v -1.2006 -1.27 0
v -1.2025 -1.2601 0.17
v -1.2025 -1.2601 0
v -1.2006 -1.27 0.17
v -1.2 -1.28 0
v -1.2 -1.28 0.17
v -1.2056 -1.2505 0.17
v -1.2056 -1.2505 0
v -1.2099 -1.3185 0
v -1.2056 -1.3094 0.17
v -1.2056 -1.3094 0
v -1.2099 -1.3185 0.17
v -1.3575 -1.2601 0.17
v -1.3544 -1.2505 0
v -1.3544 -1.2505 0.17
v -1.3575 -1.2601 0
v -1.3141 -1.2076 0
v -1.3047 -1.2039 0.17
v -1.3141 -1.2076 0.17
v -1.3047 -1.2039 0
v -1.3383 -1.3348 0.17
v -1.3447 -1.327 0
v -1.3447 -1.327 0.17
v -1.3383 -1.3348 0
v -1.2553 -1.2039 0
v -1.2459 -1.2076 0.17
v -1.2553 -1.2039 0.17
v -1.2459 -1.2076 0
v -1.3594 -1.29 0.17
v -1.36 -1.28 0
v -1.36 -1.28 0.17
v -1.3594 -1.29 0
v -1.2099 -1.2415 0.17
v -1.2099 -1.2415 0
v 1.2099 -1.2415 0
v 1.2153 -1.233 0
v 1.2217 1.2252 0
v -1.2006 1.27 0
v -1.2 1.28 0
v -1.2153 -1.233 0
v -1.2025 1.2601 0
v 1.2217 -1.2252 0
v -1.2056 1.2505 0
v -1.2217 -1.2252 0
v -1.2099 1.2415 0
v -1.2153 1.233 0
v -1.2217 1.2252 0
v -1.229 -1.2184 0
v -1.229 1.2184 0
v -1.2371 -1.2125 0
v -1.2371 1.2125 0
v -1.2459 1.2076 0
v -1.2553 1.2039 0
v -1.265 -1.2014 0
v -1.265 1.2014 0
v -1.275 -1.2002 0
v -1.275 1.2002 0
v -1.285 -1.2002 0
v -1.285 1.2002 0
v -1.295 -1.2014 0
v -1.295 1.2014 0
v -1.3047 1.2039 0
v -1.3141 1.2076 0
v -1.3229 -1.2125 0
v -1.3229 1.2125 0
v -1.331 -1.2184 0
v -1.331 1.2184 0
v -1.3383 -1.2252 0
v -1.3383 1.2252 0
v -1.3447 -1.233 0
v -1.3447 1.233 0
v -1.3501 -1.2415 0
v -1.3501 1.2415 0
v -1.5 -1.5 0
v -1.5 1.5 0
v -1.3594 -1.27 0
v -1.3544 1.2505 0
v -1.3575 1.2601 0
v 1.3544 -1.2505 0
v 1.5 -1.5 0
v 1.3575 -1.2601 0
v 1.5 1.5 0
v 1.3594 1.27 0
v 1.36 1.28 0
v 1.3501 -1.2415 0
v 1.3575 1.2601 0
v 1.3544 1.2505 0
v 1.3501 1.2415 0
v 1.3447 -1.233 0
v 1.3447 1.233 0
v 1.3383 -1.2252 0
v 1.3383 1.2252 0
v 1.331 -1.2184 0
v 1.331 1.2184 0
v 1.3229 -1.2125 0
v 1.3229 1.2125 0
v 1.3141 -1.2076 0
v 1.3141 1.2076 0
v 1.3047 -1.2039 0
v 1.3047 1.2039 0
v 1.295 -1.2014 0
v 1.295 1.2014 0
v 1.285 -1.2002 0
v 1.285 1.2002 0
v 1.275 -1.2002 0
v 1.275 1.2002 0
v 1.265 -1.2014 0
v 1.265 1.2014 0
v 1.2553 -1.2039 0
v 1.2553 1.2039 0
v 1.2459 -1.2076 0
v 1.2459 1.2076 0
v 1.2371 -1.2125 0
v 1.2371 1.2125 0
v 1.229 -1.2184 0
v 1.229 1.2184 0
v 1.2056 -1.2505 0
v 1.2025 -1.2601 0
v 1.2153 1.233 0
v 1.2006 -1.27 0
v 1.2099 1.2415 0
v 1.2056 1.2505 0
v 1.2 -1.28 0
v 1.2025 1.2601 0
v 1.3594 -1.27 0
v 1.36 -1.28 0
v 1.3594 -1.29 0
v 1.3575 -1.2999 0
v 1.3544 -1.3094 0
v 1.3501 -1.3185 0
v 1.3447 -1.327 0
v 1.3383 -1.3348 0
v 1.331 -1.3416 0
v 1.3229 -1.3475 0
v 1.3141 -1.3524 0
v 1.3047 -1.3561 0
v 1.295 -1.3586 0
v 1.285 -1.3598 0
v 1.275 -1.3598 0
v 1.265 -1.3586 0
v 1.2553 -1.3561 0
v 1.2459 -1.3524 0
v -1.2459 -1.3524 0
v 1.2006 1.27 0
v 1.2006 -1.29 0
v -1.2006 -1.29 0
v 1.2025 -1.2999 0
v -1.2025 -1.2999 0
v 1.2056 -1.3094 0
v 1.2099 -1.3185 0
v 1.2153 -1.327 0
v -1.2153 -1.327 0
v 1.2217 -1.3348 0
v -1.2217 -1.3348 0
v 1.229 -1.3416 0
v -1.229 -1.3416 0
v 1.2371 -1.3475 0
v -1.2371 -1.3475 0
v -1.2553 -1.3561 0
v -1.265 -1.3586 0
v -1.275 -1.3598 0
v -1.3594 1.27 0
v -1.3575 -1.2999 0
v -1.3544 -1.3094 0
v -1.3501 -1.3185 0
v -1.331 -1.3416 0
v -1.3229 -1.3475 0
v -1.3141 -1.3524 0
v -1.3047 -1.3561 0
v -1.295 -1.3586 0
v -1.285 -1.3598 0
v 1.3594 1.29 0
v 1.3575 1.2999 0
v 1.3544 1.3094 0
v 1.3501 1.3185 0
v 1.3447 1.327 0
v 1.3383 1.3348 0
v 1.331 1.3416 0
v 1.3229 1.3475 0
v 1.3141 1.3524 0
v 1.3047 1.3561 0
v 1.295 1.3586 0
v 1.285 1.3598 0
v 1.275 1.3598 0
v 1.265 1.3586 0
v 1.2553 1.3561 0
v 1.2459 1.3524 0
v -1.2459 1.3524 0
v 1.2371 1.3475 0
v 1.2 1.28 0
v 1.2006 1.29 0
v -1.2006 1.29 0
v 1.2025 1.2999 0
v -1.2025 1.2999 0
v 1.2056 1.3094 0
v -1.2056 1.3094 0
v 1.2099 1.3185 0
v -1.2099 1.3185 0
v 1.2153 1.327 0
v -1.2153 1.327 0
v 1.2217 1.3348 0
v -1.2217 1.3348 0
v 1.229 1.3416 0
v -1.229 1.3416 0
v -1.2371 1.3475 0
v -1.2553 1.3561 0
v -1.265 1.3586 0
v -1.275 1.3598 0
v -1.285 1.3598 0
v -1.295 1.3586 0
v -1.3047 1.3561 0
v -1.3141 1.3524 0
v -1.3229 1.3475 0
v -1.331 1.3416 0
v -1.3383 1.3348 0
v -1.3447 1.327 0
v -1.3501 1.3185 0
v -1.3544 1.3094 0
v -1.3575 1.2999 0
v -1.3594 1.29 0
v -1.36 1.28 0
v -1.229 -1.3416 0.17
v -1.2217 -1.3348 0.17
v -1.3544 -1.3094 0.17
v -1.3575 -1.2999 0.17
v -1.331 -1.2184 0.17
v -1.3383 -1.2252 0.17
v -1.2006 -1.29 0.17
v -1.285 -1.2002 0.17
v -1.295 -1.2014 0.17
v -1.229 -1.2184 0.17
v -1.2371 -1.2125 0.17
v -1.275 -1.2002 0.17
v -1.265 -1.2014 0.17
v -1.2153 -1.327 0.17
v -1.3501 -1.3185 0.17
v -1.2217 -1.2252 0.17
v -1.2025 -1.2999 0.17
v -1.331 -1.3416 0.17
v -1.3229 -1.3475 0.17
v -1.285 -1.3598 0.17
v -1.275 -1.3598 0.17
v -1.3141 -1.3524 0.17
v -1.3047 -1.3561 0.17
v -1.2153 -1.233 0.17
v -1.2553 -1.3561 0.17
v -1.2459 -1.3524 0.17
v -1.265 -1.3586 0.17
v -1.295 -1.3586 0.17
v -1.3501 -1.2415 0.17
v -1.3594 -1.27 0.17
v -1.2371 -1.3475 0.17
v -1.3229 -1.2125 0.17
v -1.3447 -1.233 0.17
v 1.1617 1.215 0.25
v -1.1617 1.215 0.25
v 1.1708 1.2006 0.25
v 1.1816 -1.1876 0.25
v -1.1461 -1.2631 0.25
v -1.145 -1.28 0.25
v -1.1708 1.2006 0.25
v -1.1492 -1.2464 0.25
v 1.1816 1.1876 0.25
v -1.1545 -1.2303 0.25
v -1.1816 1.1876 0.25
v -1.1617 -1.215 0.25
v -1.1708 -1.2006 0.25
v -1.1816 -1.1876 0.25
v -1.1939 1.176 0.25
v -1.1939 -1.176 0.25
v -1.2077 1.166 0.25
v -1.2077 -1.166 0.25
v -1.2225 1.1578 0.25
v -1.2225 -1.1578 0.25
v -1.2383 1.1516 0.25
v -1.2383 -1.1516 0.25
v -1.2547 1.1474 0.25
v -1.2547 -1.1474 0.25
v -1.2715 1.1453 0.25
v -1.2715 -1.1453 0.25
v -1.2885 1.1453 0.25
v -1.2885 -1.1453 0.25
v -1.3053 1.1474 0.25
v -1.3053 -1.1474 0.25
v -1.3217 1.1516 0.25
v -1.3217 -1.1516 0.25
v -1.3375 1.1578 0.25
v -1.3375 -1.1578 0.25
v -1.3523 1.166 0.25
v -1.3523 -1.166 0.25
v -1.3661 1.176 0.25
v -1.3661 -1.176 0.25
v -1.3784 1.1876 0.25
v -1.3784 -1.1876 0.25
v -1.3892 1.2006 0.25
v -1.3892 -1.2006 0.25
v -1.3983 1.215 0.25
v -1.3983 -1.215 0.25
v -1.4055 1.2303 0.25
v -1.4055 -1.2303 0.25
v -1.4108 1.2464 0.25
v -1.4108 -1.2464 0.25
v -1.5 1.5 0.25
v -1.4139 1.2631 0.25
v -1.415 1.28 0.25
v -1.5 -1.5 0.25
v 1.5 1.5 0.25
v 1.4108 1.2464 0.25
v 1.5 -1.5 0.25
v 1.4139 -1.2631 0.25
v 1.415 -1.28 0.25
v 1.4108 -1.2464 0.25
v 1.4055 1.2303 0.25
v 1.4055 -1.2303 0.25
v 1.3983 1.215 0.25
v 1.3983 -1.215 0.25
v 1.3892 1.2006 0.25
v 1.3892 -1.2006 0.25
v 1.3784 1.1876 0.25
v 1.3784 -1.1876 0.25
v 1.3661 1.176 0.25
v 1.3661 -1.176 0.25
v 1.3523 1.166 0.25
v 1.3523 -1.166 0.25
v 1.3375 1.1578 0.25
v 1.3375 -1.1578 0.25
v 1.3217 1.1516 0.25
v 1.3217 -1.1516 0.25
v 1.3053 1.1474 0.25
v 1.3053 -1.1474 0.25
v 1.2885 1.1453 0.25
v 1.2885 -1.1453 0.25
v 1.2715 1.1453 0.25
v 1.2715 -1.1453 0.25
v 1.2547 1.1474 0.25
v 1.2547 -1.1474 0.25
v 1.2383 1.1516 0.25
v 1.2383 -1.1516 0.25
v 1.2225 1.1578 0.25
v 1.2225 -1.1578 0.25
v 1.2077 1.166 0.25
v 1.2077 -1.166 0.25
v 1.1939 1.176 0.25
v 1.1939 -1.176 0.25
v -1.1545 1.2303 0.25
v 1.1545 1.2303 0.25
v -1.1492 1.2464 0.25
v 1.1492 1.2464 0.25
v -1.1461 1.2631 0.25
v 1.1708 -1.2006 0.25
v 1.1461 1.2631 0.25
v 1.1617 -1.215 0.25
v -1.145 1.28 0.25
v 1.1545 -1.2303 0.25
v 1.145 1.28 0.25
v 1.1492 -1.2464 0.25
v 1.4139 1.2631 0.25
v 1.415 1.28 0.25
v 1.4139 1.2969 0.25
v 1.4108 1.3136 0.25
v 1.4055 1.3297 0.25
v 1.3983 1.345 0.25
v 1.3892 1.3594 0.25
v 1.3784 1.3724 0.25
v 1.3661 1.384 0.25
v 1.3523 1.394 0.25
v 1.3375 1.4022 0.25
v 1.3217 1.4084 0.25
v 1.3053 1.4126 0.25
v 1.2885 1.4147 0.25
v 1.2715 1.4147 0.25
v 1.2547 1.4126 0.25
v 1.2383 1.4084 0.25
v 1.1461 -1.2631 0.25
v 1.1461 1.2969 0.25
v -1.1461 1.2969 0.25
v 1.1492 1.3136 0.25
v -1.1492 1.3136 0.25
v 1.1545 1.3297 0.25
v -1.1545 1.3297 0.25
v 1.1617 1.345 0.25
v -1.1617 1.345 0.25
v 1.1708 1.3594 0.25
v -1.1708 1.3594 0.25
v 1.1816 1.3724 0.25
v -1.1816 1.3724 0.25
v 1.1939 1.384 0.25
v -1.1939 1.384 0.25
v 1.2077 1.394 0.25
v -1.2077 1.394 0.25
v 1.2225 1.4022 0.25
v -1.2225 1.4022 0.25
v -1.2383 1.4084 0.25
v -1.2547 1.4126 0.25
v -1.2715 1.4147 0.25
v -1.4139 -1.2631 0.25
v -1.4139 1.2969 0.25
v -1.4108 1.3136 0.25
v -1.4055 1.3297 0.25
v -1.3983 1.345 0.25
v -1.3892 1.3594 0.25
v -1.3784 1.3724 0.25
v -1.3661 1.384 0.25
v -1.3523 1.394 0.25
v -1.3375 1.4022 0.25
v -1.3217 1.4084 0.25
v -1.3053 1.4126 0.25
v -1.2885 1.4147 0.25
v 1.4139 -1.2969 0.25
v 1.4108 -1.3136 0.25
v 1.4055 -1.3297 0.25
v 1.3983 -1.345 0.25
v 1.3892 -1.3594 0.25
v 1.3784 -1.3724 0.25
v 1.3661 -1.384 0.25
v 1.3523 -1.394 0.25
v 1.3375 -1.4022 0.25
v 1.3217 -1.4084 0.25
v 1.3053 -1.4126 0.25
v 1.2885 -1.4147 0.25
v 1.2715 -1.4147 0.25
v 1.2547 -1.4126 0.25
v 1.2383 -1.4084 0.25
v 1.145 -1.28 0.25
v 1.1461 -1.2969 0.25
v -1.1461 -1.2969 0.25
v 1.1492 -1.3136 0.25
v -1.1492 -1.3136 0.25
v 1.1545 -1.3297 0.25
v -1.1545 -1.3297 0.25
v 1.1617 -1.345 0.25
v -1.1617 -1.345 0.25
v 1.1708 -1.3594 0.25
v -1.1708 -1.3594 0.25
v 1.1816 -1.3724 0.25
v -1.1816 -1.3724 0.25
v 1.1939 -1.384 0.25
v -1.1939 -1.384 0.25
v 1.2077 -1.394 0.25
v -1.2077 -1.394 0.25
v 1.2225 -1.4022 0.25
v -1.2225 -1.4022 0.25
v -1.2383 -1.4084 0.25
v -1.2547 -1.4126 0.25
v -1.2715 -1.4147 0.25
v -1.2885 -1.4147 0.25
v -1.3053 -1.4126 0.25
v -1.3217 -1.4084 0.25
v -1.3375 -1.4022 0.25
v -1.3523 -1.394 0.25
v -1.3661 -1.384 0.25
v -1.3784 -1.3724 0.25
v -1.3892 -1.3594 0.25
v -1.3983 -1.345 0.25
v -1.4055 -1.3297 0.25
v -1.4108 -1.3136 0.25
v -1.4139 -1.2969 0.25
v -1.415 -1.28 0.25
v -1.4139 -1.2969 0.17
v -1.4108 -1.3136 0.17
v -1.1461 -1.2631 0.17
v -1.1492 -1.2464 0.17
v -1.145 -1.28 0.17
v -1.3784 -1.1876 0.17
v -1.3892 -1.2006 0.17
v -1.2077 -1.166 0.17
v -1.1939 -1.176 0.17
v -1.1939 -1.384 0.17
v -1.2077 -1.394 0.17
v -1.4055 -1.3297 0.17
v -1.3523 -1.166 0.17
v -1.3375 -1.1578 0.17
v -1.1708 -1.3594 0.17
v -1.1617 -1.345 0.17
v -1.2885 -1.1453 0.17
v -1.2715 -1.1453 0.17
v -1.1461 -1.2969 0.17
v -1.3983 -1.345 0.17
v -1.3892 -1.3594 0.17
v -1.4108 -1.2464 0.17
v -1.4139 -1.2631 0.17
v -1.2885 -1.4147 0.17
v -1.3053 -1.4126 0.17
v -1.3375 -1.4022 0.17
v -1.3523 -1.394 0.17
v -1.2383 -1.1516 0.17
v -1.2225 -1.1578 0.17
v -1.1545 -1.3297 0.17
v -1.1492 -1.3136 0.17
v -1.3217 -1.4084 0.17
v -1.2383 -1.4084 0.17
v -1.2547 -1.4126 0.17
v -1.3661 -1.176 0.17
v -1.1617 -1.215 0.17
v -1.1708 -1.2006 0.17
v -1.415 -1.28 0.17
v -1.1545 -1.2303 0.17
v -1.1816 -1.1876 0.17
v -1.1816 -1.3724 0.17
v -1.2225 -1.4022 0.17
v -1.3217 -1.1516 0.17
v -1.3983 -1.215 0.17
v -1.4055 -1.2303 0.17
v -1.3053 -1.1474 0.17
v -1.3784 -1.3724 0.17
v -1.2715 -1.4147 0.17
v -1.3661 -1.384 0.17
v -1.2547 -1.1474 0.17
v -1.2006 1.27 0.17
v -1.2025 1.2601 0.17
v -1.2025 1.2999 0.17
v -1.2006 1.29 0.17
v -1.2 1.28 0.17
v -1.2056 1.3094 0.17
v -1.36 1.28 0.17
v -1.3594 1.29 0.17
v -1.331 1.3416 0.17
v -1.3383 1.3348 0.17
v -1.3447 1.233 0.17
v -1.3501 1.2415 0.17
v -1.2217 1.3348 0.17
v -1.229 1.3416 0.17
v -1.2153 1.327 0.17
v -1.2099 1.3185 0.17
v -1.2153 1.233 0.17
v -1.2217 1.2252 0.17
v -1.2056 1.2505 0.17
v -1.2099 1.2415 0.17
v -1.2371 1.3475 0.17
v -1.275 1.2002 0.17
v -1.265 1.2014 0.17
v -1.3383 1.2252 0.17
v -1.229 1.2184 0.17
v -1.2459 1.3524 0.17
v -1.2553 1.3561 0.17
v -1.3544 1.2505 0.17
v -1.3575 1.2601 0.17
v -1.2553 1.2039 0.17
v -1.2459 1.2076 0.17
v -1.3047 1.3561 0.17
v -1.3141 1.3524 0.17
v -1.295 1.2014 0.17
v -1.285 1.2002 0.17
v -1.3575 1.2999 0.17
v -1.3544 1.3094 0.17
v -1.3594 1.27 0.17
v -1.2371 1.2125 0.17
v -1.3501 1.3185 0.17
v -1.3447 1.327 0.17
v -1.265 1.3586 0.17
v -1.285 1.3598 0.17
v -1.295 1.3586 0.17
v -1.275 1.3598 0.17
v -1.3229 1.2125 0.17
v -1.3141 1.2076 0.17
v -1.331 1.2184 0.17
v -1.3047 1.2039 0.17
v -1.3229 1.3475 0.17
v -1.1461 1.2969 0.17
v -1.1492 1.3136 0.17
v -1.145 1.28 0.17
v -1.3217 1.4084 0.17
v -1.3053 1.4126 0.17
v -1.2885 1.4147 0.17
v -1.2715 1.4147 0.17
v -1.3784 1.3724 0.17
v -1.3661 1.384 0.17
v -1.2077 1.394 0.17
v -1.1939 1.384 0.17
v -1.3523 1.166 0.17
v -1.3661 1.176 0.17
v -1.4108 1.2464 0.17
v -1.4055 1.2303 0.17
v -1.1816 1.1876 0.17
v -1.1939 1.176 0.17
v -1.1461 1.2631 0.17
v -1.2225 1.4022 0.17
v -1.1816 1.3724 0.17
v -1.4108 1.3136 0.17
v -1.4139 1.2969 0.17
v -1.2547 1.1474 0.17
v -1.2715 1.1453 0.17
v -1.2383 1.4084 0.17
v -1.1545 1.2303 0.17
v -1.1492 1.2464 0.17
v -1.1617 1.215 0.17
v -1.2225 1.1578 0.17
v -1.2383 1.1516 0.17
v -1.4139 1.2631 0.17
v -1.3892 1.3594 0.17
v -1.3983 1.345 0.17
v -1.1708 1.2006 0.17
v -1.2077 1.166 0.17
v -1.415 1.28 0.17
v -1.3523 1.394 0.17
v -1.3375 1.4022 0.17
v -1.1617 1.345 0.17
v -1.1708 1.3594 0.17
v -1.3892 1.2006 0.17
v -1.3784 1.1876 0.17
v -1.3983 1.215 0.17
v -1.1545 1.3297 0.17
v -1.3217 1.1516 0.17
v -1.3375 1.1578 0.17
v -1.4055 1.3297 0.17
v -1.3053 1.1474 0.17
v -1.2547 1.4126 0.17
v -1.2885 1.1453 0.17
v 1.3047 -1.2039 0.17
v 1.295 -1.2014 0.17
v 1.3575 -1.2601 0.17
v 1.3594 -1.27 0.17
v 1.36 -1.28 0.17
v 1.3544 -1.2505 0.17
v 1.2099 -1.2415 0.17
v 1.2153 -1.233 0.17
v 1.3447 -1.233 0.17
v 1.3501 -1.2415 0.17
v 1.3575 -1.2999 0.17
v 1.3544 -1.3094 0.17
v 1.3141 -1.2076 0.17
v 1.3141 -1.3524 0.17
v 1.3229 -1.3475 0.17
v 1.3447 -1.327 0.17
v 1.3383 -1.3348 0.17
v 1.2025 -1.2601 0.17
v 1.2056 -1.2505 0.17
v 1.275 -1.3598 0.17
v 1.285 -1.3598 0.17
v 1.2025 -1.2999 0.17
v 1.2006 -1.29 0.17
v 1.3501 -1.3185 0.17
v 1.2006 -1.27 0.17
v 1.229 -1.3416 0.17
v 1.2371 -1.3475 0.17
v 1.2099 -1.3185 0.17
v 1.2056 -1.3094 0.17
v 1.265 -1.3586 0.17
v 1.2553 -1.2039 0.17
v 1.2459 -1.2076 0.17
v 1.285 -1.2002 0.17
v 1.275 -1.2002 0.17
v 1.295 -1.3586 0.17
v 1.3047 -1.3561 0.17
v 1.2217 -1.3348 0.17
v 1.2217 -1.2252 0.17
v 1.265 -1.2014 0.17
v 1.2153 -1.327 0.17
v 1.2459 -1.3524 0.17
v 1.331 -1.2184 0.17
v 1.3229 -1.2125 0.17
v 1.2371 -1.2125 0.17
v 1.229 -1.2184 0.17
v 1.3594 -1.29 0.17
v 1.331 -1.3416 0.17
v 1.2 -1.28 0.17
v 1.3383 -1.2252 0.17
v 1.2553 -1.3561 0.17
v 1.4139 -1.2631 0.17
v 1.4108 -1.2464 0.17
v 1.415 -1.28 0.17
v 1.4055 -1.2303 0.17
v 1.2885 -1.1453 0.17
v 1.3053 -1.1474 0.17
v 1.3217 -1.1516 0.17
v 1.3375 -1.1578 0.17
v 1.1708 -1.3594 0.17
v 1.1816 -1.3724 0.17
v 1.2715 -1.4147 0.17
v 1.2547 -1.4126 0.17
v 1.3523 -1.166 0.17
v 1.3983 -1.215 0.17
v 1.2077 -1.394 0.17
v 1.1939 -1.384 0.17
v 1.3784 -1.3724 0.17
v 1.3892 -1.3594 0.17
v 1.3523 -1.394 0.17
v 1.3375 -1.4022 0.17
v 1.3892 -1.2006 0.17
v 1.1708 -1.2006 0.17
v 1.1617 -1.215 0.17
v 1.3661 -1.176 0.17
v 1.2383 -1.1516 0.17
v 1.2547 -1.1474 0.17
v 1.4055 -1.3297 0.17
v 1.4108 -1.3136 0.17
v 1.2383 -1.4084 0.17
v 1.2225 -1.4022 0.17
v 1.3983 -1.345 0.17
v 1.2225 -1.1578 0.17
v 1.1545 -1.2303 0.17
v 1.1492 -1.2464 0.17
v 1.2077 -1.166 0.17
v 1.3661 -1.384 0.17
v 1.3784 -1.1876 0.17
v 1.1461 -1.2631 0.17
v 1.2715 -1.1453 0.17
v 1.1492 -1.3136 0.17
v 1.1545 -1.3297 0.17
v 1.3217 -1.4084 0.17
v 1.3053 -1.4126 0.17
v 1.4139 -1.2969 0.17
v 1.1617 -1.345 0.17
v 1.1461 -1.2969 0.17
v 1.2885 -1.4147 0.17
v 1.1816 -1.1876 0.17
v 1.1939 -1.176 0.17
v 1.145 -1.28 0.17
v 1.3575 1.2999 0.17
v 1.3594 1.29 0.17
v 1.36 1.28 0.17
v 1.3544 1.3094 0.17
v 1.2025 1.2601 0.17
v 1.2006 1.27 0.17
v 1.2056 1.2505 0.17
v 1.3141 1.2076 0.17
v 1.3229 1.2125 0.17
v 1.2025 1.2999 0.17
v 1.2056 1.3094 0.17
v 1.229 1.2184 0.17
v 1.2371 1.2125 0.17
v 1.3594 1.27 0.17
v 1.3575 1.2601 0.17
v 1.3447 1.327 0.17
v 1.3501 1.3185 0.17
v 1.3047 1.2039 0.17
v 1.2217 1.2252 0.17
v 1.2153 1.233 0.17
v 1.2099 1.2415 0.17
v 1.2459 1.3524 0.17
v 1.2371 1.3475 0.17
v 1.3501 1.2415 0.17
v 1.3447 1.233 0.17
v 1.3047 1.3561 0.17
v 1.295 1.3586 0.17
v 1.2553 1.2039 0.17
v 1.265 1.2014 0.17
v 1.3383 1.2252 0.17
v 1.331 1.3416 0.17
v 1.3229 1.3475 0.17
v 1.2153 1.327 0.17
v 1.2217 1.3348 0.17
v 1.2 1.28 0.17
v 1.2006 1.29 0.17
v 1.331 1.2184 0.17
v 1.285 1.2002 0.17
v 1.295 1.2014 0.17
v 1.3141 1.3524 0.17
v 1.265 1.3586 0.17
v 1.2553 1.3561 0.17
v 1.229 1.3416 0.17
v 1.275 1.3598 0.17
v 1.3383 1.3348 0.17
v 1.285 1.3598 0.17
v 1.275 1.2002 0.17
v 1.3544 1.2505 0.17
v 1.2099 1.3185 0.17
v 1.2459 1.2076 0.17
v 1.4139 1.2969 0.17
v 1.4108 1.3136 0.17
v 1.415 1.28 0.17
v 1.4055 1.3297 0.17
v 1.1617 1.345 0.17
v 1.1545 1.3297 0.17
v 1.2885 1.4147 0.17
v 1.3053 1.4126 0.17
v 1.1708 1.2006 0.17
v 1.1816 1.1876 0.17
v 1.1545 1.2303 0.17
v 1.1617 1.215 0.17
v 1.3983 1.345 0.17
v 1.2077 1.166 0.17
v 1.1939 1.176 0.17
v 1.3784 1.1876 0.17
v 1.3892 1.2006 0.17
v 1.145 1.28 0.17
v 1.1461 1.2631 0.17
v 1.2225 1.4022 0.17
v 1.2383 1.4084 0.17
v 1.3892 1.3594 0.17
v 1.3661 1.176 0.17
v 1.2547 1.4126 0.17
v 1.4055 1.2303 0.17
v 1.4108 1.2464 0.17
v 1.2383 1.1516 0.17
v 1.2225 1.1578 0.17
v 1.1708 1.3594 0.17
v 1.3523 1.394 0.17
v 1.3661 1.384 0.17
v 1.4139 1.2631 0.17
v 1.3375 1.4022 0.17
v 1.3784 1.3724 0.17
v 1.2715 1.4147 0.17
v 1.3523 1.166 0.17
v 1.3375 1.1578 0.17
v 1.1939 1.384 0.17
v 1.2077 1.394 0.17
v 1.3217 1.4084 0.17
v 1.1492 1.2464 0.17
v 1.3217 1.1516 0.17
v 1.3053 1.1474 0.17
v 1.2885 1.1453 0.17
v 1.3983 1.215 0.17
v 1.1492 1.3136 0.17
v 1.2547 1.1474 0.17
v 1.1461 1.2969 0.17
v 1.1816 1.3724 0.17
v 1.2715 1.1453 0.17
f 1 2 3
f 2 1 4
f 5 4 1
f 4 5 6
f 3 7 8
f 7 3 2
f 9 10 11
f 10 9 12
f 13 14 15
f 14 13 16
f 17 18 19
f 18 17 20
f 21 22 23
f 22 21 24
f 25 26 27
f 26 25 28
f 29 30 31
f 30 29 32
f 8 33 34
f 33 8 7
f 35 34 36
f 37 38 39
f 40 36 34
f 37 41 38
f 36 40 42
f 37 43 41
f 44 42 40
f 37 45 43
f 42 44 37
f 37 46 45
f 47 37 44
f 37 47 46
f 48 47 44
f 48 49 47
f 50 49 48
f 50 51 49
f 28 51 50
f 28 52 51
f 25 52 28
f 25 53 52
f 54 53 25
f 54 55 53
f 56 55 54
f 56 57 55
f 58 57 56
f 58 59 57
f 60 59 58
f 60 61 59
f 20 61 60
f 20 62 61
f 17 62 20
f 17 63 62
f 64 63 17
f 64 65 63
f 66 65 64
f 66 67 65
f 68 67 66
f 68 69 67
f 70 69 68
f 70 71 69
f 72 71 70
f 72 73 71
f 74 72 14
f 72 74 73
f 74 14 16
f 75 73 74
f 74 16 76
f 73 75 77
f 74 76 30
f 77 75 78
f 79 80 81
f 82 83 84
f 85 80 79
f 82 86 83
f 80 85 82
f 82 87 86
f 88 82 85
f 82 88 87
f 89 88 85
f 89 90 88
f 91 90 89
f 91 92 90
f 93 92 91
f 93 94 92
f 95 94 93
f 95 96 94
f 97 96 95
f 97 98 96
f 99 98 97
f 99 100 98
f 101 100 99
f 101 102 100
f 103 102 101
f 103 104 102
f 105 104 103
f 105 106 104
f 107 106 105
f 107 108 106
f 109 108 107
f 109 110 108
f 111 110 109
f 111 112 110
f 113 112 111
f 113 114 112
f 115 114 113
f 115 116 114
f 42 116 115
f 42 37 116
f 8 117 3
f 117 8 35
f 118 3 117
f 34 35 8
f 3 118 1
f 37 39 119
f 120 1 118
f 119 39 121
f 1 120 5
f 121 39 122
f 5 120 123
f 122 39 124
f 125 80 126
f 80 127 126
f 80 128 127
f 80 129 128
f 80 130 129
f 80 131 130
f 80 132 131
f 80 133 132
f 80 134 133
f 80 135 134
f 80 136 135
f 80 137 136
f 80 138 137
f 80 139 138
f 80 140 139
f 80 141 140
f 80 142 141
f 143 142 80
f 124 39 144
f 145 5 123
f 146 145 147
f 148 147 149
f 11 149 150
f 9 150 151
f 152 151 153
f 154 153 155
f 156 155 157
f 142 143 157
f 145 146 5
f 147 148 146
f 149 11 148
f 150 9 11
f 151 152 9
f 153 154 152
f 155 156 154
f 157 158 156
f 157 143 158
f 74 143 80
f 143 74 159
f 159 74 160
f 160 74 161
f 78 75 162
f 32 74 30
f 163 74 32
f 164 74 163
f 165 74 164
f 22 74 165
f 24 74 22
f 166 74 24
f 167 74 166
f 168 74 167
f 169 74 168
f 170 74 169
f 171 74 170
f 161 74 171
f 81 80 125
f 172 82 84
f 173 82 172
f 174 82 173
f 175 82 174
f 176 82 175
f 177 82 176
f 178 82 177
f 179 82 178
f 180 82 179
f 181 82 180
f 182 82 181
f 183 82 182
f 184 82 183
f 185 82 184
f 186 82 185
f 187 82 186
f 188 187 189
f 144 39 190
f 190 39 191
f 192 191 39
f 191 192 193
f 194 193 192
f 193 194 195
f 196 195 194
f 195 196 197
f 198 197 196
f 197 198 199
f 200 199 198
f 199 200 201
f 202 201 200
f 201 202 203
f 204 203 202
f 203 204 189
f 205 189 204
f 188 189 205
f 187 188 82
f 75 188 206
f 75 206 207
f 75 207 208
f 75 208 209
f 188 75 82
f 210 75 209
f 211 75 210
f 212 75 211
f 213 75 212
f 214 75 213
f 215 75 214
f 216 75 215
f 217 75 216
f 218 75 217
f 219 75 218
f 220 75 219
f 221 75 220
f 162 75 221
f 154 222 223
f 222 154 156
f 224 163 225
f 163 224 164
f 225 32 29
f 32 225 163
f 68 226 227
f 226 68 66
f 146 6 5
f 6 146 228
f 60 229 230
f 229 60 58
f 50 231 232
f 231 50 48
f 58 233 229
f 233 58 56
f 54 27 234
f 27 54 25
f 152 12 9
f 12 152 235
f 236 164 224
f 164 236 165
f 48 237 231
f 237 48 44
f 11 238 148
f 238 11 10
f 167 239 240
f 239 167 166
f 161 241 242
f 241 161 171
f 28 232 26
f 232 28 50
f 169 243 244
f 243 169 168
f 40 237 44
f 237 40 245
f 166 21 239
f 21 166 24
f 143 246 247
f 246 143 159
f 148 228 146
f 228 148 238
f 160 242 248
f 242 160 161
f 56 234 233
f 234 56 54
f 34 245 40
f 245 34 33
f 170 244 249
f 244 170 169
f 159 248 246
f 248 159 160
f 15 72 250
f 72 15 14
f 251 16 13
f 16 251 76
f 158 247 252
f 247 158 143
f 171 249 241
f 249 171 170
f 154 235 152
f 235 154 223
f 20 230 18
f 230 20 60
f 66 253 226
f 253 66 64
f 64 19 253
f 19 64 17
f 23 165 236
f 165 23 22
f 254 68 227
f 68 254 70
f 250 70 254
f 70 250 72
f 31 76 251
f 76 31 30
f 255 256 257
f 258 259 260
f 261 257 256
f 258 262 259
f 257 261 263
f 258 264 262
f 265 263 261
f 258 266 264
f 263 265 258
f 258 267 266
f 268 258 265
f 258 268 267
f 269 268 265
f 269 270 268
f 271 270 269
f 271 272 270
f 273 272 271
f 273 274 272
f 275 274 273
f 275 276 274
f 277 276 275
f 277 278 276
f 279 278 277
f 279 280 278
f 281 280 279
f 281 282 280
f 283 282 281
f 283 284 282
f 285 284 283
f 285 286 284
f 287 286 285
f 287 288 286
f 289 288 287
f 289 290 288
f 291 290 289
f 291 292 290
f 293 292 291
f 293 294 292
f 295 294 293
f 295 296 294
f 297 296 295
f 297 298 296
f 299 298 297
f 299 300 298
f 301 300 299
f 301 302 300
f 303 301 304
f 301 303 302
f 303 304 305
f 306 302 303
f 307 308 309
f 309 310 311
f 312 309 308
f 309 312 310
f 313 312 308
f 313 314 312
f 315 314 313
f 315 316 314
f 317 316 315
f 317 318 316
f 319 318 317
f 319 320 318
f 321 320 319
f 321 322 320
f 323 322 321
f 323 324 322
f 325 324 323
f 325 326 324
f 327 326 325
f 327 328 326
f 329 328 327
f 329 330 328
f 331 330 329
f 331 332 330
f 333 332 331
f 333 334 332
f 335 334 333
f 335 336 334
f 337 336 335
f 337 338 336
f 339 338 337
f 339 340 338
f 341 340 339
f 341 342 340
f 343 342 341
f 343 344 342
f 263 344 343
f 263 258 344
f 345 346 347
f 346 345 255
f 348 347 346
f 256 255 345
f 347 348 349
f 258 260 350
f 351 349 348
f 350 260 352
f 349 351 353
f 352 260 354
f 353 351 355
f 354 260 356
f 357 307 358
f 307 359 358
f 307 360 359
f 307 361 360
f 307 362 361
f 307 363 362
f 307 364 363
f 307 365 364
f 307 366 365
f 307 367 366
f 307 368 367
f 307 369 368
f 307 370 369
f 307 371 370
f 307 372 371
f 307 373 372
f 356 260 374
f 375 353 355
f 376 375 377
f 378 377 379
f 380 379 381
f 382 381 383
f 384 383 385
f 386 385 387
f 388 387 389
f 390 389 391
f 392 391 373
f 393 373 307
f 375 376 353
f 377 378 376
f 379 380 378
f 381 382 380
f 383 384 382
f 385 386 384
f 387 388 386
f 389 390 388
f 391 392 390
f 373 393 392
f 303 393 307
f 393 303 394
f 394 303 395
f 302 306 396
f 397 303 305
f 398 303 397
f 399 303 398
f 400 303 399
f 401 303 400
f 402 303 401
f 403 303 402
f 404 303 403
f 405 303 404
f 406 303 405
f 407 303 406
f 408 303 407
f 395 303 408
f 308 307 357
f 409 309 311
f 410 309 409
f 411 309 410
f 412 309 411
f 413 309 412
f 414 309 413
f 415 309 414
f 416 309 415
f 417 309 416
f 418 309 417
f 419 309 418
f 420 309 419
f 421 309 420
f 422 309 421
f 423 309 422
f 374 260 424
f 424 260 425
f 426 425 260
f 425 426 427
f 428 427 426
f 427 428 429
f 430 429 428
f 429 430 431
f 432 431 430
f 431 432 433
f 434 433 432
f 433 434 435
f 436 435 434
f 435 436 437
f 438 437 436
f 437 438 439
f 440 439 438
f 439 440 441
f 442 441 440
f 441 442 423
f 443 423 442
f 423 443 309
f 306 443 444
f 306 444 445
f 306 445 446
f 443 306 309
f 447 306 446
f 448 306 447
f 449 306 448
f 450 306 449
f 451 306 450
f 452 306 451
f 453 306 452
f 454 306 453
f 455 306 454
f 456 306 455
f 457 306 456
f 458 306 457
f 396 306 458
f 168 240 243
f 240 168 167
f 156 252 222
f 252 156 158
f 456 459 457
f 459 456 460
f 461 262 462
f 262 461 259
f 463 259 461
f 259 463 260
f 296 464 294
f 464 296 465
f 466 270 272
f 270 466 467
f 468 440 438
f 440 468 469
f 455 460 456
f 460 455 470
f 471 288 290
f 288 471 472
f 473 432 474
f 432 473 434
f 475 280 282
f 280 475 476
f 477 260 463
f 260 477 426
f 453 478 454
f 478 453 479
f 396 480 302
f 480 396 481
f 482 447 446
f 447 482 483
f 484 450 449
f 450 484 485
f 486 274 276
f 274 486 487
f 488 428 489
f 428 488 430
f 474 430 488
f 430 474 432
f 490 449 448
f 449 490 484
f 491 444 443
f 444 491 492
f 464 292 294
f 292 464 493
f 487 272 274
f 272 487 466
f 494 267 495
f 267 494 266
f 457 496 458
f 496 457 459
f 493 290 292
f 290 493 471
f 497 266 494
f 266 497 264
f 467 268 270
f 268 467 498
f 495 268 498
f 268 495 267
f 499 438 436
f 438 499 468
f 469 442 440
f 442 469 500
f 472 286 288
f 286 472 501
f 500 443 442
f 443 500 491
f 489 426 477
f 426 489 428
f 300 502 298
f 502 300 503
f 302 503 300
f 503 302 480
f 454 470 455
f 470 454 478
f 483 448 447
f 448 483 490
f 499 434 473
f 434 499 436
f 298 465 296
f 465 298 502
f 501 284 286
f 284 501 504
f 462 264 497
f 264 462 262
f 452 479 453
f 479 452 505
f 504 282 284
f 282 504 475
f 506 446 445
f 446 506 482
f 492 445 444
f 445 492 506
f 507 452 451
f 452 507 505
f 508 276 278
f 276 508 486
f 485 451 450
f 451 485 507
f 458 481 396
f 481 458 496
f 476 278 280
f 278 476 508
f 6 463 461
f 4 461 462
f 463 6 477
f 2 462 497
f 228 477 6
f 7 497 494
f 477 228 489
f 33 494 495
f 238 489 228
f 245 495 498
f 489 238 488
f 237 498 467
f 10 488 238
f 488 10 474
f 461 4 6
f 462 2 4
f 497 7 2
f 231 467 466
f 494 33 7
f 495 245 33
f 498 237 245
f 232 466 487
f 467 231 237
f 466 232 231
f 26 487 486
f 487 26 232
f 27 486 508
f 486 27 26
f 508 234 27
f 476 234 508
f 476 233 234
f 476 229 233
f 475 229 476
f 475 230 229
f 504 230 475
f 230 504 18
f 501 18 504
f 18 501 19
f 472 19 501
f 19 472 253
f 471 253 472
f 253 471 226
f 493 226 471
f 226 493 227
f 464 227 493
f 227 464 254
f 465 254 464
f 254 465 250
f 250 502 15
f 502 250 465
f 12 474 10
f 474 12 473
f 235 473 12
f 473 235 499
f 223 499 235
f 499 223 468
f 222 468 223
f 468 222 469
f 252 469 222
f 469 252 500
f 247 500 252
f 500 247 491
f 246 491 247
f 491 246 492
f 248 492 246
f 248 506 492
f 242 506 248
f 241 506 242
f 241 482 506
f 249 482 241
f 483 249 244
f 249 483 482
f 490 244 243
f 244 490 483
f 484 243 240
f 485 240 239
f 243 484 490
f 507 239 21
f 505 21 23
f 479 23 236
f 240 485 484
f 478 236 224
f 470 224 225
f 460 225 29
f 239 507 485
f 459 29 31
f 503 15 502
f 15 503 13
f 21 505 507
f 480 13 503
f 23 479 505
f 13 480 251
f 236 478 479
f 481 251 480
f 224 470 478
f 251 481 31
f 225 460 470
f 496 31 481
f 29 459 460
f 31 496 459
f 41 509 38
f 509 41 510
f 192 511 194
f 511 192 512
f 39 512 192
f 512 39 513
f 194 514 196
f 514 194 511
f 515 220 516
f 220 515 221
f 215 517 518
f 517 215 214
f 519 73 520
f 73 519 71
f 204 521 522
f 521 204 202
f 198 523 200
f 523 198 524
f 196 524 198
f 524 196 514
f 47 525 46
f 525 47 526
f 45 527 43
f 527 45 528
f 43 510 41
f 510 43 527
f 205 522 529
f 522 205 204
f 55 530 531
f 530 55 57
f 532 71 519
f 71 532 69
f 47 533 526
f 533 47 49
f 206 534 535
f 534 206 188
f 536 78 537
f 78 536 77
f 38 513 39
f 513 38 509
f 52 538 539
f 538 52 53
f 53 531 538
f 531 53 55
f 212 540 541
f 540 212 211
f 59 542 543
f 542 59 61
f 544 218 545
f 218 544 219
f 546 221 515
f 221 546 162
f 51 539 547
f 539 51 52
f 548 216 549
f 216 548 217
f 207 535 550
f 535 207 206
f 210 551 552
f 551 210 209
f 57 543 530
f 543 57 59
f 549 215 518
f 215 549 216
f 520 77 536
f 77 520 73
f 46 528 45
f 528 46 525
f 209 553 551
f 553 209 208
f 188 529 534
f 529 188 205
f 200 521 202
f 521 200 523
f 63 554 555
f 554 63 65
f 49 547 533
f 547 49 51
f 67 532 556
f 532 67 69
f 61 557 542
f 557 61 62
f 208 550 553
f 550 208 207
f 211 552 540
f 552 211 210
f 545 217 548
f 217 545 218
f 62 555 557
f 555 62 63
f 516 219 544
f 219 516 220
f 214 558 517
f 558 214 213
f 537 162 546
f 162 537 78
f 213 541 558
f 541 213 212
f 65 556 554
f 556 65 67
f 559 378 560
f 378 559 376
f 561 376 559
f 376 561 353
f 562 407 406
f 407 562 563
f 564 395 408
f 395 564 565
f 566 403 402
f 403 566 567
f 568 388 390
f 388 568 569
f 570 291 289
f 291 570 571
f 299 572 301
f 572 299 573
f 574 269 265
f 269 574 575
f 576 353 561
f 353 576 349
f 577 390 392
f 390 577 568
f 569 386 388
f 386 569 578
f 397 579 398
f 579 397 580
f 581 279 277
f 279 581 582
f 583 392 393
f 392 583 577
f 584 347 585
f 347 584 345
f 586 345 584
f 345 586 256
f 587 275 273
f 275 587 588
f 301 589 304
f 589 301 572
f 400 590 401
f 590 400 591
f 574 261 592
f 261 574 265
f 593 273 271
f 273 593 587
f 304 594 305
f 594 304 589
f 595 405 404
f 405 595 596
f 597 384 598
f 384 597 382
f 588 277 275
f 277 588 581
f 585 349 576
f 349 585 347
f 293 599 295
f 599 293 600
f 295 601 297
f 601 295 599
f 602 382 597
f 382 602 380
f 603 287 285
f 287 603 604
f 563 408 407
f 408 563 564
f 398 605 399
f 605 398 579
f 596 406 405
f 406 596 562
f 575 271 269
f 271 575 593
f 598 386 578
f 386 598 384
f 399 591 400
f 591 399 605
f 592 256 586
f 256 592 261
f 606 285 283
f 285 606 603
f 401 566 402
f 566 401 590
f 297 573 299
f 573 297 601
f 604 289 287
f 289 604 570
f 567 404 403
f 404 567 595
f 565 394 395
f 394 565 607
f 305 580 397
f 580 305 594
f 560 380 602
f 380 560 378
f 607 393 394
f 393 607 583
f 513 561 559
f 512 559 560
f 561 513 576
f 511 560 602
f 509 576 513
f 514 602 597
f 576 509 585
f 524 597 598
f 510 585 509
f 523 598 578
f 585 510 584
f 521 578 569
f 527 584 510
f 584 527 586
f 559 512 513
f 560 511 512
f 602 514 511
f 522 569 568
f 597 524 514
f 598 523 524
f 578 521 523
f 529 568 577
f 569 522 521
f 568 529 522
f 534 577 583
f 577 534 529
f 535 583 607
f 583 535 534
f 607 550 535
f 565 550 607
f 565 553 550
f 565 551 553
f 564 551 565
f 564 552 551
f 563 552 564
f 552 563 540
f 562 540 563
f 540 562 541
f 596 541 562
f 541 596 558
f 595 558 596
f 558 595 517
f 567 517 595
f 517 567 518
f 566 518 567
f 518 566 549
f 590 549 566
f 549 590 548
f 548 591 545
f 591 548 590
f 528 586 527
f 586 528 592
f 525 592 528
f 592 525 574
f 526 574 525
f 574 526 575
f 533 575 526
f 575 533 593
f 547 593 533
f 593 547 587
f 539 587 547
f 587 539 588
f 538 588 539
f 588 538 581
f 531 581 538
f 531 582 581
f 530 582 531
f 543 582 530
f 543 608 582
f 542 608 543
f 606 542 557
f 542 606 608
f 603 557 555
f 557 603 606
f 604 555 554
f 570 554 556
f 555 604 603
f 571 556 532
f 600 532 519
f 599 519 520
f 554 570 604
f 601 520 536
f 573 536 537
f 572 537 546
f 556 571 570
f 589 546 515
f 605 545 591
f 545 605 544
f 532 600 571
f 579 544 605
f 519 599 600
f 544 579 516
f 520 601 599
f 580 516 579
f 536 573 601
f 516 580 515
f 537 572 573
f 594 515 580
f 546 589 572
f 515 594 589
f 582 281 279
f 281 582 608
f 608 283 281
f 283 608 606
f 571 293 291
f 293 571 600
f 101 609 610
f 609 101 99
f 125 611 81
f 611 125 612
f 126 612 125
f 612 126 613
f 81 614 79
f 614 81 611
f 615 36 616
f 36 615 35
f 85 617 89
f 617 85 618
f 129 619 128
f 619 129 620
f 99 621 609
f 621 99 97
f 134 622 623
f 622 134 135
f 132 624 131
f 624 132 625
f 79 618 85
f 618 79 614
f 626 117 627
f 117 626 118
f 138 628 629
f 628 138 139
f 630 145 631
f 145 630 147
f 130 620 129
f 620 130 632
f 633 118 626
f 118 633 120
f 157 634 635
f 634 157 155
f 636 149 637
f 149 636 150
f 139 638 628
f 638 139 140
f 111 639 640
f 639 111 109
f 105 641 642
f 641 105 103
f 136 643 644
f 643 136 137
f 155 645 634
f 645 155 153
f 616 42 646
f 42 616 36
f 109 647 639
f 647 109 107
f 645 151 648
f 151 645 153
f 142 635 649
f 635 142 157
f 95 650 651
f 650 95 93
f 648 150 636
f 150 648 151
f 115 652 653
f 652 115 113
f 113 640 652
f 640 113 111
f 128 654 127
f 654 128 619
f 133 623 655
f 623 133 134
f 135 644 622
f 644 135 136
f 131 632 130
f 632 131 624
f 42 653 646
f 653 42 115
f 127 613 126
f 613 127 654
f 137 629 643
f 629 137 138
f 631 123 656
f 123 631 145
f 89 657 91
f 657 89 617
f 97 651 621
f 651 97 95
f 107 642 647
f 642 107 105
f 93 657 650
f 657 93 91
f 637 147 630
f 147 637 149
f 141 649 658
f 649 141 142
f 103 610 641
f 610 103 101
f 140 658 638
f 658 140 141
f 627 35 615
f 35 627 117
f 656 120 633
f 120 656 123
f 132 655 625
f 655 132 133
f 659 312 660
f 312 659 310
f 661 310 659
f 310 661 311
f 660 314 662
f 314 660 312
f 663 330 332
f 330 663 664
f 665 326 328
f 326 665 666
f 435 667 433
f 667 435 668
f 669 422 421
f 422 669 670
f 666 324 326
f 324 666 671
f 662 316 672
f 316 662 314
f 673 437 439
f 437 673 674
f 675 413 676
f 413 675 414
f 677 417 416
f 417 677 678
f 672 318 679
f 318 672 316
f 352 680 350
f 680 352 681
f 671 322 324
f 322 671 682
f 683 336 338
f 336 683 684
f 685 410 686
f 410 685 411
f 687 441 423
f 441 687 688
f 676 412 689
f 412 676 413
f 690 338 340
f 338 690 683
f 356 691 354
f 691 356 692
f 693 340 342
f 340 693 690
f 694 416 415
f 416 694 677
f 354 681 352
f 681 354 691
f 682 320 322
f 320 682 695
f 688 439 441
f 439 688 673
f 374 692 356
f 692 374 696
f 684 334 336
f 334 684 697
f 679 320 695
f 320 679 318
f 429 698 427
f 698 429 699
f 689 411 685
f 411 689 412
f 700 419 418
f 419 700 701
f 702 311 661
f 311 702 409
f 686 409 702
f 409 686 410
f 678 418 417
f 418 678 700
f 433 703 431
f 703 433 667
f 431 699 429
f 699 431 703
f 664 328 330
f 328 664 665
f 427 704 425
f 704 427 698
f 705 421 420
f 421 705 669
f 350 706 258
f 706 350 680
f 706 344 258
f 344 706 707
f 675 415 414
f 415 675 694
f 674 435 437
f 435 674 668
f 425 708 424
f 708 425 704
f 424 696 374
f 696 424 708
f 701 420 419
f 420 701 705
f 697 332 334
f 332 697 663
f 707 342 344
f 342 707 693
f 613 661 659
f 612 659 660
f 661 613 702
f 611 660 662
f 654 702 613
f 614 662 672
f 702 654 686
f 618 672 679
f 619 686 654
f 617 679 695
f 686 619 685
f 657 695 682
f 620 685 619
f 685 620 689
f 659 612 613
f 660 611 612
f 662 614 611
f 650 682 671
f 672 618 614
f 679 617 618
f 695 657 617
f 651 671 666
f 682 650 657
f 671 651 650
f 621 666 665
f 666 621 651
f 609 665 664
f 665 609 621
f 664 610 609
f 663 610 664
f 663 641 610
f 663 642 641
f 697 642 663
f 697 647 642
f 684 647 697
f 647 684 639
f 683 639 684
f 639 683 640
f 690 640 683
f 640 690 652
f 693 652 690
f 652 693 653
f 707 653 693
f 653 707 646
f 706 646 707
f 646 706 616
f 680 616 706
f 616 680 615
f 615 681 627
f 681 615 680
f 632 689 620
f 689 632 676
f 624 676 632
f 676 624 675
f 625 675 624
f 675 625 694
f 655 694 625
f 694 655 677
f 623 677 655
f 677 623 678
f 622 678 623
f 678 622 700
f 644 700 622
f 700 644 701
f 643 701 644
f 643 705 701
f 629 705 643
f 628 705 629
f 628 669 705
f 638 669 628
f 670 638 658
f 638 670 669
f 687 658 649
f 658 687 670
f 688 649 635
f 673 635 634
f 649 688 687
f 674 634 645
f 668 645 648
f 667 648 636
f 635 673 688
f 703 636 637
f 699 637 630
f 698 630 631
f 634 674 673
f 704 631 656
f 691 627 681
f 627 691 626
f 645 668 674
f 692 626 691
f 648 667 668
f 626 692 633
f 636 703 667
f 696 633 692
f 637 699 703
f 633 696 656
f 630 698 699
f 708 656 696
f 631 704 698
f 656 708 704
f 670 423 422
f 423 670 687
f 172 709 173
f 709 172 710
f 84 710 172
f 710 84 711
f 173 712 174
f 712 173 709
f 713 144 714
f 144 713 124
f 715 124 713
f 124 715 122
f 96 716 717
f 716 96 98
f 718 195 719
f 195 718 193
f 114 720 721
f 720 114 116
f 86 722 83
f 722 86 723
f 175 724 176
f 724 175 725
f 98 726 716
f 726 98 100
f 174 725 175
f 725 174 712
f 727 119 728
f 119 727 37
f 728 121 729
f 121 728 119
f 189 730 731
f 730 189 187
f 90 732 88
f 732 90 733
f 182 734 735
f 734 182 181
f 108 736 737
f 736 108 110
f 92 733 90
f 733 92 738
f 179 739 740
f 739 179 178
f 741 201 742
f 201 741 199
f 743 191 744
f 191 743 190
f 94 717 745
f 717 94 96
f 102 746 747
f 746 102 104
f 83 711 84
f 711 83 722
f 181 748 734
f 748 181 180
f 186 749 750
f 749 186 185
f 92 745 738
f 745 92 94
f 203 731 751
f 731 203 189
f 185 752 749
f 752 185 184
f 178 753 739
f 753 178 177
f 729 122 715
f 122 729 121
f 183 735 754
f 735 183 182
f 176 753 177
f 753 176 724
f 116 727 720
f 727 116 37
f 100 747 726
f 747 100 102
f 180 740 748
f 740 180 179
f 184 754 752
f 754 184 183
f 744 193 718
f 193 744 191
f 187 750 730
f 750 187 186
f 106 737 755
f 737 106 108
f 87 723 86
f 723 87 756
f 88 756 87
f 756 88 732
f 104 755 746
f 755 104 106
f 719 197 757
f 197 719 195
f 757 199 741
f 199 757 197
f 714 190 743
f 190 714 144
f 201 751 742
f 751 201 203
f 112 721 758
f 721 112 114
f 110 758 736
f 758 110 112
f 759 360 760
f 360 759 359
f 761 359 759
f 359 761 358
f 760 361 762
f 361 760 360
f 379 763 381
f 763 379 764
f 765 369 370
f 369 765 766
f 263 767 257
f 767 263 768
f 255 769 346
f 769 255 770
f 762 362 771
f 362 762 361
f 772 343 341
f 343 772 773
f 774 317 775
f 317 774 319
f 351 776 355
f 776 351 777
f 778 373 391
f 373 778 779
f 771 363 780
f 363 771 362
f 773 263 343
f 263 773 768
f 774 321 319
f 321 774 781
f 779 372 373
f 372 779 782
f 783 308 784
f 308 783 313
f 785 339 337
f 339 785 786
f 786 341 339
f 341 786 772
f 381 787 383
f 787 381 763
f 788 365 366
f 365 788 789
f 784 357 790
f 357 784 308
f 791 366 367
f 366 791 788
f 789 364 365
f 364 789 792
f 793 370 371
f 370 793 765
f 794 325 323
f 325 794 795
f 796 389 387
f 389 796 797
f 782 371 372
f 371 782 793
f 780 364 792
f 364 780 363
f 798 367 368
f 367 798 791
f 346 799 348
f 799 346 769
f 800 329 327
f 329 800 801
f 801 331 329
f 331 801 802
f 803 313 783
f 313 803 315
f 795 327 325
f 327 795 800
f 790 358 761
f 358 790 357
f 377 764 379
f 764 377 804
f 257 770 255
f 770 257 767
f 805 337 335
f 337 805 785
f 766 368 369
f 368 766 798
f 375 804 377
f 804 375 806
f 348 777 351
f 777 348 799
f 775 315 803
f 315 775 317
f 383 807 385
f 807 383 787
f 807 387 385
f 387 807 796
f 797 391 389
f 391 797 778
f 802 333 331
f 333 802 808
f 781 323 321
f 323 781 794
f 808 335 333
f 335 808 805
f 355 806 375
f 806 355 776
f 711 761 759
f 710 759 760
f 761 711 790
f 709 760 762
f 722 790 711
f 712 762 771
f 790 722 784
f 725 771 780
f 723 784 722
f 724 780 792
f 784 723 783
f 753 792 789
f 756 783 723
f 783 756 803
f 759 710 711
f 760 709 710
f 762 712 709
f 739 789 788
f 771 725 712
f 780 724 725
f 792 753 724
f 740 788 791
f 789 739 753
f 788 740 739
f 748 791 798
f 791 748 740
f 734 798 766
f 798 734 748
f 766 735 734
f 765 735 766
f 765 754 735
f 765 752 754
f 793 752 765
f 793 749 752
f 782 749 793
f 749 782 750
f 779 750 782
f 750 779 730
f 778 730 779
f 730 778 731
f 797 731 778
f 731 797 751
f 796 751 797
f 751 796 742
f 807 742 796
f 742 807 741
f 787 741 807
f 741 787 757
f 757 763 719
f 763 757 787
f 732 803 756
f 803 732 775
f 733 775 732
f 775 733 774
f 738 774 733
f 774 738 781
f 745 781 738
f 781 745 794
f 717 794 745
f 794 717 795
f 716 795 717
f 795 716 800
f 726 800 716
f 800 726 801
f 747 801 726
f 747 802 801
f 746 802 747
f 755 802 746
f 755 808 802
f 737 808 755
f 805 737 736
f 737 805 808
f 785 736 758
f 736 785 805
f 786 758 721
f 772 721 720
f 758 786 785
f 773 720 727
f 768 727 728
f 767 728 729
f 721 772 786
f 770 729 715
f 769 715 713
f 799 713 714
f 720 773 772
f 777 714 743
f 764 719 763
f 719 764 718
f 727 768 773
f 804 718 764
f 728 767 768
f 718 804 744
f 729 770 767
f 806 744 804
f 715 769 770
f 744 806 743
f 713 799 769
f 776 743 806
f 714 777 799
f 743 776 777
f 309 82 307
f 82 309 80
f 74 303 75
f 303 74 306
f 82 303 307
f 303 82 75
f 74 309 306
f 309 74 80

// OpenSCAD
//Written by Ryan Branch on 7/8/2017
//Default values are listed in inches

//Special variables:
$fn = 50;

//User-defined parameters:
    //TURNTABLE SPECIFICATIONS
    turntable_width = 3.000;
    turntable_thickness = 0.390;
    turntable_top_hole_spacing = 2.560;
    turntable_top_hole_diameter = 0.160;
    turntable_bottom_hole_spacing = 2.560;
    turntable_bottom_hole_diameter = 0.160;
    turntable_central_hole_diameter = 2.710;
    //MOTOR SPECIFICATIONS
    motor_width = 1.700;
    motor_body_height = 1.950;
    motor_raised_circle_height = 0.090;
    motor_raised_circle_diameter = 0.880;
    motor_hole_spacing = 1.220;
    motor_hole_diameter = 0.160;
    motor_shaft_length = 0.945;
    motor_shaft_diameter = 0.208;
	motor_wire_exit_width = 0.510;
    motor_wire_exit_height = 0.510;
    //Thickness of extra space for sliding wire between motor wall and part wall
    motor_wire_clearance_width = 0.250;
    //The distance above the motor face plate that any component sticks out
    motor_clearance_height = 0.2;
    //FASTENER SPECIFICATIONS
    outside_bottom_nut_thickness = 0.080;
    outside_bottom_nut_largest_diameter = 0.270;
    inside_bottom_nut_thickness = 0.080;
    inside_bottom_nut_largest_diameter = 0.270;
    top_nut_thickness = 0.080;
    top_nut_largest_diameter = 0.270;

//Writer-defined parameters:
    //BOTTOM PARAMETERS
    
    //LOWER BRACKET PARAMETERS
    //horizontal thicknesses
    hthick_lower_bracket_walls = 0.500;
    
    //UPPER BRACKET PARAMETERS
    //vertical thicknesses
    vthick_bottom_plate = 0.250;
    vthick_upper_bracket_plate = 0.125;
    vthick_top_plate = 0.250;
    vthick_space_below_coupler = 0.100;
    //"below" refers to after the part has been flipped over 180 degrees
    vthick_below_vents = 0.250;
    //horizontal thicknesses
    hthick_shaft_coupler_ring = 0.125;
    hthick_shaft_coupler_panel = 0.100;
    hthick_shaft_coupler_gap = 0.03;
    //other
    shaft_coupler_panel_length = 0.300;
    shaft_coupler_hole_diameter = 0.160;
    
    //TOP PARAMETERS


//Part 1: Bottom Plate
// - This part is connected to the motor body via the motor holes
// - This part is connected to the turntable via the turntable bottom holes,
//    through the Lower Mounting Bracket
difference() {
    //Create the bottom plate, horizontally centered but vertically at 0
    translate([0,0,(vthick_bottom_plate / 2)]) {
        cube([turntable_width, turntable_width, vthick_bottom_plate], true);
    }
    
    //Holes, defined as cylinders which are then subtracted from the bottom plate
    for(xMultiplier = [-1:2:1]) {
        for(yMultiplier = [-1:2:1]) {
            //Holes for attaching to turntable
            translate([(xMultiplier * (turntable_bottom_hole_spacing / 2)),
                       (yMultiplier * (turntable_bottom_hole_spacing / 2)),
                       0]) {
                cylinder(vthick_bottom_plate,
                         (turntable_bottom_hole_diameter / 2),
                         (turntable_bottom_hole_diameter / 2));
            }
            //Spaces for nuts involved in attachment to turntable
            translate([(xMultiplier * (turntable_bottom_hole_spacing / 2)),
                       (yMultiplier * (turntable_bottom_hole_spacing / 2)),
                       (vthick_bottom_plate - outside_bottom_nut_thickness)]) {
                cylinder((outside_bottom_nut_thickness),
                         (outside_bottom_nut_largest_diameter / 2),
                         (outside_bottom_nut_largest_diameter / 2));
            }
        }
    }
}
